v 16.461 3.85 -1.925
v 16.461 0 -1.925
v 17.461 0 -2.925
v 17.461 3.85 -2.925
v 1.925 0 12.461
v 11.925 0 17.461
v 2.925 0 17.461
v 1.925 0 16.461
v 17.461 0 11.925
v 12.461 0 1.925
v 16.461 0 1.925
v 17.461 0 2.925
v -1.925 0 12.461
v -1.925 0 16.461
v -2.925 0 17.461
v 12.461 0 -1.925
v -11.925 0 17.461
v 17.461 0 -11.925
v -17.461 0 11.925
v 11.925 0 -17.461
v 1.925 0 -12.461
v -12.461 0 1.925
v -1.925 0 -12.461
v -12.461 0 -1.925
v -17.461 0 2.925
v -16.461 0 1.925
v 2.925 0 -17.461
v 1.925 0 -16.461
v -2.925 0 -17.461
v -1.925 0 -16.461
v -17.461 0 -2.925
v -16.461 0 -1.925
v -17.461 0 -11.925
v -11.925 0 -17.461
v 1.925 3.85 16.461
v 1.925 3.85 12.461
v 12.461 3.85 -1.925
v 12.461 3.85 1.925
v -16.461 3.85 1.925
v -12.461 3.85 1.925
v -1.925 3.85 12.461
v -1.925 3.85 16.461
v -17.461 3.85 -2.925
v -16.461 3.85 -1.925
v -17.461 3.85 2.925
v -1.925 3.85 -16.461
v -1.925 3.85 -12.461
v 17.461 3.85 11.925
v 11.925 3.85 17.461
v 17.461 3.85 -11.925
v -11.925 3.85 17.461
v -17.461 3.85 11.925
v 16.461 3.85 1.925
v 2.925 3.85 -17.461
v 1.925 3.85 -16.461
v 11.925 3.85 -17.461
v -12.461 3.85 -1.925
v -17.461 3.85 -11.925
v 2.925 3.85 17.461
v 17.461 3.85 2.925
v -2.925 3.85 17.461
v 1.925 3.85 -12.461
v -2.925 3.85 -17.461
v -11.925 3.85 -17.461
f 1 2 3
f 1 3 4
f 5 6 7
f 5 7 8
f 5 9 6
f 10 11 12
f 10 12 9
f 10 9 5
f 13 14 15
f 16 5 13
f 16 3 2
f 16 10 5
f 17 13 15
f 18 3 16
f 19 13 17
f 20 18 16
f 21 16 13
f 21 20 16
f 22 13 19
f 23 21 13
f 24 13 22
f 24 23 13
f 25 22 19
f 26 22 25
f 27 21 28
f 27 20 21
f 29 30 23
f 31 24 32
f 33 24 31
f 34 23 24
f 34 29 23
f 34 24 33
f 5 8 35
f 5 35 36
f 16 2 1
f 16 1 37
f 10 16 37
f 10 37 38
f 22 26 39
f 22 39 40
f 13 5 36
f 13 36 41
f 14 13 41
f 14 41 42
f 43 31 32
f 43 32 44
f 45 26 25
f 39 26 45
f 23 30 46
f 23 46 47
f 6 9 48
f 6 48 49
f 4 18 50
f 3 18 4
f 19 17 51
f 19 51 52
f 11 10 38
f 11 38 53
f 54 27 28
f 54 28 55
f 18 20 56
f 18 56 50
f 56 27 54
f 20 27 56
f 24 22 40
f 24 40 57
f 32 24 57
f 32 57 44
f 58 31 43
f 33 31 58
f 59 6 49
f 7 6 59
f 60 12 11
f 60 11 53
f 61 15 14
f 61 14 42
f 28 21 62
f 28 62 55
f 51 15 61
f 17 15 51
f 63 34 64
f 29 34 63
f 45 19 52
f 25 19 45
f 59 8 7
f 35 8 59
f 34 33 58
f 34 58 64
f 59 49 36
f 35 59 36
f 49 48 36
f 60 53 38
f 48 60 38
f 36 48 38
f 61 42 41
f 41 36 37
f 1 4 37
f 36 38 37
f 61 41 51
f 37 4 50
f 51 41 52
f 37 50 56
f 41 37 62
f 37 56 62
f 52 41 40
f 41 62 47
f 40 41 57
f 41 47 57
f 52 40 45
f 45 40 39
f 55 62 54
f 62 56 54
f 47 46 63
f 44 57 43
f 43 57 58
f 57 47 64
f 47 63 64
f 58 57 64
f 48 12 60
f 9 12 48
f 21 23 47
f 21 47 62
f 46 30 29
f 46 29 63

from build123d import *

# Parameters (mm, degrees)
BOSS_EXTRUDE1_DEPTH = 3.85
CHAMFER1_SIZE       = 1


with BuildPart() as part:
    # Sketch1 → Boss-Extrude1 (new body)
    with BuildSketch(Plane(origin=(0, 0, 0), x_dir=(1, 0, 0), z_dir=(0, 1, 0))):
        Polygon((17.46076087, -11.925), (11.925, -17.46076087), (1.925, -17.46076087), (1.925, -12.46076087), (-1.925, -12.46076087), (-1.925, -17.46076087), (-11.925, -17.46076087), (-17.46076087, -11.925), (-17.46076087, -1.925), (-12.46076087, -1.925), (-12.46076087, 1.925), (-17.46076087, 1.925), (-17.46076087, 11.925), (-11.925, 17.46076087), (-1.925, 17.46076087), (-1.925, 12.46076087), (1.925, 12.46076087), (1.925, 17.46076087), (11.925, 17.46076087), (17.46076087, 11.925), (17.46076087, 1.925), (12.46076087, 1.925), (12.46076087, -1.925), (17.46076087, -1.925), align=None)
    extrude(amount=BOSS_EXTRUDE1_DEPTH)

    # Chamfer1
    chamfer1_edges = [part.edges().sort_by_distance(p)[0] for p in [
        (17.46076087, 1.925, -1.925),
        (17.46076087, 1.925, 1.925),
        (1.925, 1.925, 17.46076087),
        (-1.925, 1.925, 17.46076087),
        (-17.46076087, 1.925, 1.925),
        (-17.46076087, 1.925, -1.925),
        (-1.925, 1.925, -17.46076087),
        (1.925, 1.925, -17.46076087),
    ]]
    chamfer(chamfer1_edges, length=CHAMFER1_SIZE)


solid = part.part
